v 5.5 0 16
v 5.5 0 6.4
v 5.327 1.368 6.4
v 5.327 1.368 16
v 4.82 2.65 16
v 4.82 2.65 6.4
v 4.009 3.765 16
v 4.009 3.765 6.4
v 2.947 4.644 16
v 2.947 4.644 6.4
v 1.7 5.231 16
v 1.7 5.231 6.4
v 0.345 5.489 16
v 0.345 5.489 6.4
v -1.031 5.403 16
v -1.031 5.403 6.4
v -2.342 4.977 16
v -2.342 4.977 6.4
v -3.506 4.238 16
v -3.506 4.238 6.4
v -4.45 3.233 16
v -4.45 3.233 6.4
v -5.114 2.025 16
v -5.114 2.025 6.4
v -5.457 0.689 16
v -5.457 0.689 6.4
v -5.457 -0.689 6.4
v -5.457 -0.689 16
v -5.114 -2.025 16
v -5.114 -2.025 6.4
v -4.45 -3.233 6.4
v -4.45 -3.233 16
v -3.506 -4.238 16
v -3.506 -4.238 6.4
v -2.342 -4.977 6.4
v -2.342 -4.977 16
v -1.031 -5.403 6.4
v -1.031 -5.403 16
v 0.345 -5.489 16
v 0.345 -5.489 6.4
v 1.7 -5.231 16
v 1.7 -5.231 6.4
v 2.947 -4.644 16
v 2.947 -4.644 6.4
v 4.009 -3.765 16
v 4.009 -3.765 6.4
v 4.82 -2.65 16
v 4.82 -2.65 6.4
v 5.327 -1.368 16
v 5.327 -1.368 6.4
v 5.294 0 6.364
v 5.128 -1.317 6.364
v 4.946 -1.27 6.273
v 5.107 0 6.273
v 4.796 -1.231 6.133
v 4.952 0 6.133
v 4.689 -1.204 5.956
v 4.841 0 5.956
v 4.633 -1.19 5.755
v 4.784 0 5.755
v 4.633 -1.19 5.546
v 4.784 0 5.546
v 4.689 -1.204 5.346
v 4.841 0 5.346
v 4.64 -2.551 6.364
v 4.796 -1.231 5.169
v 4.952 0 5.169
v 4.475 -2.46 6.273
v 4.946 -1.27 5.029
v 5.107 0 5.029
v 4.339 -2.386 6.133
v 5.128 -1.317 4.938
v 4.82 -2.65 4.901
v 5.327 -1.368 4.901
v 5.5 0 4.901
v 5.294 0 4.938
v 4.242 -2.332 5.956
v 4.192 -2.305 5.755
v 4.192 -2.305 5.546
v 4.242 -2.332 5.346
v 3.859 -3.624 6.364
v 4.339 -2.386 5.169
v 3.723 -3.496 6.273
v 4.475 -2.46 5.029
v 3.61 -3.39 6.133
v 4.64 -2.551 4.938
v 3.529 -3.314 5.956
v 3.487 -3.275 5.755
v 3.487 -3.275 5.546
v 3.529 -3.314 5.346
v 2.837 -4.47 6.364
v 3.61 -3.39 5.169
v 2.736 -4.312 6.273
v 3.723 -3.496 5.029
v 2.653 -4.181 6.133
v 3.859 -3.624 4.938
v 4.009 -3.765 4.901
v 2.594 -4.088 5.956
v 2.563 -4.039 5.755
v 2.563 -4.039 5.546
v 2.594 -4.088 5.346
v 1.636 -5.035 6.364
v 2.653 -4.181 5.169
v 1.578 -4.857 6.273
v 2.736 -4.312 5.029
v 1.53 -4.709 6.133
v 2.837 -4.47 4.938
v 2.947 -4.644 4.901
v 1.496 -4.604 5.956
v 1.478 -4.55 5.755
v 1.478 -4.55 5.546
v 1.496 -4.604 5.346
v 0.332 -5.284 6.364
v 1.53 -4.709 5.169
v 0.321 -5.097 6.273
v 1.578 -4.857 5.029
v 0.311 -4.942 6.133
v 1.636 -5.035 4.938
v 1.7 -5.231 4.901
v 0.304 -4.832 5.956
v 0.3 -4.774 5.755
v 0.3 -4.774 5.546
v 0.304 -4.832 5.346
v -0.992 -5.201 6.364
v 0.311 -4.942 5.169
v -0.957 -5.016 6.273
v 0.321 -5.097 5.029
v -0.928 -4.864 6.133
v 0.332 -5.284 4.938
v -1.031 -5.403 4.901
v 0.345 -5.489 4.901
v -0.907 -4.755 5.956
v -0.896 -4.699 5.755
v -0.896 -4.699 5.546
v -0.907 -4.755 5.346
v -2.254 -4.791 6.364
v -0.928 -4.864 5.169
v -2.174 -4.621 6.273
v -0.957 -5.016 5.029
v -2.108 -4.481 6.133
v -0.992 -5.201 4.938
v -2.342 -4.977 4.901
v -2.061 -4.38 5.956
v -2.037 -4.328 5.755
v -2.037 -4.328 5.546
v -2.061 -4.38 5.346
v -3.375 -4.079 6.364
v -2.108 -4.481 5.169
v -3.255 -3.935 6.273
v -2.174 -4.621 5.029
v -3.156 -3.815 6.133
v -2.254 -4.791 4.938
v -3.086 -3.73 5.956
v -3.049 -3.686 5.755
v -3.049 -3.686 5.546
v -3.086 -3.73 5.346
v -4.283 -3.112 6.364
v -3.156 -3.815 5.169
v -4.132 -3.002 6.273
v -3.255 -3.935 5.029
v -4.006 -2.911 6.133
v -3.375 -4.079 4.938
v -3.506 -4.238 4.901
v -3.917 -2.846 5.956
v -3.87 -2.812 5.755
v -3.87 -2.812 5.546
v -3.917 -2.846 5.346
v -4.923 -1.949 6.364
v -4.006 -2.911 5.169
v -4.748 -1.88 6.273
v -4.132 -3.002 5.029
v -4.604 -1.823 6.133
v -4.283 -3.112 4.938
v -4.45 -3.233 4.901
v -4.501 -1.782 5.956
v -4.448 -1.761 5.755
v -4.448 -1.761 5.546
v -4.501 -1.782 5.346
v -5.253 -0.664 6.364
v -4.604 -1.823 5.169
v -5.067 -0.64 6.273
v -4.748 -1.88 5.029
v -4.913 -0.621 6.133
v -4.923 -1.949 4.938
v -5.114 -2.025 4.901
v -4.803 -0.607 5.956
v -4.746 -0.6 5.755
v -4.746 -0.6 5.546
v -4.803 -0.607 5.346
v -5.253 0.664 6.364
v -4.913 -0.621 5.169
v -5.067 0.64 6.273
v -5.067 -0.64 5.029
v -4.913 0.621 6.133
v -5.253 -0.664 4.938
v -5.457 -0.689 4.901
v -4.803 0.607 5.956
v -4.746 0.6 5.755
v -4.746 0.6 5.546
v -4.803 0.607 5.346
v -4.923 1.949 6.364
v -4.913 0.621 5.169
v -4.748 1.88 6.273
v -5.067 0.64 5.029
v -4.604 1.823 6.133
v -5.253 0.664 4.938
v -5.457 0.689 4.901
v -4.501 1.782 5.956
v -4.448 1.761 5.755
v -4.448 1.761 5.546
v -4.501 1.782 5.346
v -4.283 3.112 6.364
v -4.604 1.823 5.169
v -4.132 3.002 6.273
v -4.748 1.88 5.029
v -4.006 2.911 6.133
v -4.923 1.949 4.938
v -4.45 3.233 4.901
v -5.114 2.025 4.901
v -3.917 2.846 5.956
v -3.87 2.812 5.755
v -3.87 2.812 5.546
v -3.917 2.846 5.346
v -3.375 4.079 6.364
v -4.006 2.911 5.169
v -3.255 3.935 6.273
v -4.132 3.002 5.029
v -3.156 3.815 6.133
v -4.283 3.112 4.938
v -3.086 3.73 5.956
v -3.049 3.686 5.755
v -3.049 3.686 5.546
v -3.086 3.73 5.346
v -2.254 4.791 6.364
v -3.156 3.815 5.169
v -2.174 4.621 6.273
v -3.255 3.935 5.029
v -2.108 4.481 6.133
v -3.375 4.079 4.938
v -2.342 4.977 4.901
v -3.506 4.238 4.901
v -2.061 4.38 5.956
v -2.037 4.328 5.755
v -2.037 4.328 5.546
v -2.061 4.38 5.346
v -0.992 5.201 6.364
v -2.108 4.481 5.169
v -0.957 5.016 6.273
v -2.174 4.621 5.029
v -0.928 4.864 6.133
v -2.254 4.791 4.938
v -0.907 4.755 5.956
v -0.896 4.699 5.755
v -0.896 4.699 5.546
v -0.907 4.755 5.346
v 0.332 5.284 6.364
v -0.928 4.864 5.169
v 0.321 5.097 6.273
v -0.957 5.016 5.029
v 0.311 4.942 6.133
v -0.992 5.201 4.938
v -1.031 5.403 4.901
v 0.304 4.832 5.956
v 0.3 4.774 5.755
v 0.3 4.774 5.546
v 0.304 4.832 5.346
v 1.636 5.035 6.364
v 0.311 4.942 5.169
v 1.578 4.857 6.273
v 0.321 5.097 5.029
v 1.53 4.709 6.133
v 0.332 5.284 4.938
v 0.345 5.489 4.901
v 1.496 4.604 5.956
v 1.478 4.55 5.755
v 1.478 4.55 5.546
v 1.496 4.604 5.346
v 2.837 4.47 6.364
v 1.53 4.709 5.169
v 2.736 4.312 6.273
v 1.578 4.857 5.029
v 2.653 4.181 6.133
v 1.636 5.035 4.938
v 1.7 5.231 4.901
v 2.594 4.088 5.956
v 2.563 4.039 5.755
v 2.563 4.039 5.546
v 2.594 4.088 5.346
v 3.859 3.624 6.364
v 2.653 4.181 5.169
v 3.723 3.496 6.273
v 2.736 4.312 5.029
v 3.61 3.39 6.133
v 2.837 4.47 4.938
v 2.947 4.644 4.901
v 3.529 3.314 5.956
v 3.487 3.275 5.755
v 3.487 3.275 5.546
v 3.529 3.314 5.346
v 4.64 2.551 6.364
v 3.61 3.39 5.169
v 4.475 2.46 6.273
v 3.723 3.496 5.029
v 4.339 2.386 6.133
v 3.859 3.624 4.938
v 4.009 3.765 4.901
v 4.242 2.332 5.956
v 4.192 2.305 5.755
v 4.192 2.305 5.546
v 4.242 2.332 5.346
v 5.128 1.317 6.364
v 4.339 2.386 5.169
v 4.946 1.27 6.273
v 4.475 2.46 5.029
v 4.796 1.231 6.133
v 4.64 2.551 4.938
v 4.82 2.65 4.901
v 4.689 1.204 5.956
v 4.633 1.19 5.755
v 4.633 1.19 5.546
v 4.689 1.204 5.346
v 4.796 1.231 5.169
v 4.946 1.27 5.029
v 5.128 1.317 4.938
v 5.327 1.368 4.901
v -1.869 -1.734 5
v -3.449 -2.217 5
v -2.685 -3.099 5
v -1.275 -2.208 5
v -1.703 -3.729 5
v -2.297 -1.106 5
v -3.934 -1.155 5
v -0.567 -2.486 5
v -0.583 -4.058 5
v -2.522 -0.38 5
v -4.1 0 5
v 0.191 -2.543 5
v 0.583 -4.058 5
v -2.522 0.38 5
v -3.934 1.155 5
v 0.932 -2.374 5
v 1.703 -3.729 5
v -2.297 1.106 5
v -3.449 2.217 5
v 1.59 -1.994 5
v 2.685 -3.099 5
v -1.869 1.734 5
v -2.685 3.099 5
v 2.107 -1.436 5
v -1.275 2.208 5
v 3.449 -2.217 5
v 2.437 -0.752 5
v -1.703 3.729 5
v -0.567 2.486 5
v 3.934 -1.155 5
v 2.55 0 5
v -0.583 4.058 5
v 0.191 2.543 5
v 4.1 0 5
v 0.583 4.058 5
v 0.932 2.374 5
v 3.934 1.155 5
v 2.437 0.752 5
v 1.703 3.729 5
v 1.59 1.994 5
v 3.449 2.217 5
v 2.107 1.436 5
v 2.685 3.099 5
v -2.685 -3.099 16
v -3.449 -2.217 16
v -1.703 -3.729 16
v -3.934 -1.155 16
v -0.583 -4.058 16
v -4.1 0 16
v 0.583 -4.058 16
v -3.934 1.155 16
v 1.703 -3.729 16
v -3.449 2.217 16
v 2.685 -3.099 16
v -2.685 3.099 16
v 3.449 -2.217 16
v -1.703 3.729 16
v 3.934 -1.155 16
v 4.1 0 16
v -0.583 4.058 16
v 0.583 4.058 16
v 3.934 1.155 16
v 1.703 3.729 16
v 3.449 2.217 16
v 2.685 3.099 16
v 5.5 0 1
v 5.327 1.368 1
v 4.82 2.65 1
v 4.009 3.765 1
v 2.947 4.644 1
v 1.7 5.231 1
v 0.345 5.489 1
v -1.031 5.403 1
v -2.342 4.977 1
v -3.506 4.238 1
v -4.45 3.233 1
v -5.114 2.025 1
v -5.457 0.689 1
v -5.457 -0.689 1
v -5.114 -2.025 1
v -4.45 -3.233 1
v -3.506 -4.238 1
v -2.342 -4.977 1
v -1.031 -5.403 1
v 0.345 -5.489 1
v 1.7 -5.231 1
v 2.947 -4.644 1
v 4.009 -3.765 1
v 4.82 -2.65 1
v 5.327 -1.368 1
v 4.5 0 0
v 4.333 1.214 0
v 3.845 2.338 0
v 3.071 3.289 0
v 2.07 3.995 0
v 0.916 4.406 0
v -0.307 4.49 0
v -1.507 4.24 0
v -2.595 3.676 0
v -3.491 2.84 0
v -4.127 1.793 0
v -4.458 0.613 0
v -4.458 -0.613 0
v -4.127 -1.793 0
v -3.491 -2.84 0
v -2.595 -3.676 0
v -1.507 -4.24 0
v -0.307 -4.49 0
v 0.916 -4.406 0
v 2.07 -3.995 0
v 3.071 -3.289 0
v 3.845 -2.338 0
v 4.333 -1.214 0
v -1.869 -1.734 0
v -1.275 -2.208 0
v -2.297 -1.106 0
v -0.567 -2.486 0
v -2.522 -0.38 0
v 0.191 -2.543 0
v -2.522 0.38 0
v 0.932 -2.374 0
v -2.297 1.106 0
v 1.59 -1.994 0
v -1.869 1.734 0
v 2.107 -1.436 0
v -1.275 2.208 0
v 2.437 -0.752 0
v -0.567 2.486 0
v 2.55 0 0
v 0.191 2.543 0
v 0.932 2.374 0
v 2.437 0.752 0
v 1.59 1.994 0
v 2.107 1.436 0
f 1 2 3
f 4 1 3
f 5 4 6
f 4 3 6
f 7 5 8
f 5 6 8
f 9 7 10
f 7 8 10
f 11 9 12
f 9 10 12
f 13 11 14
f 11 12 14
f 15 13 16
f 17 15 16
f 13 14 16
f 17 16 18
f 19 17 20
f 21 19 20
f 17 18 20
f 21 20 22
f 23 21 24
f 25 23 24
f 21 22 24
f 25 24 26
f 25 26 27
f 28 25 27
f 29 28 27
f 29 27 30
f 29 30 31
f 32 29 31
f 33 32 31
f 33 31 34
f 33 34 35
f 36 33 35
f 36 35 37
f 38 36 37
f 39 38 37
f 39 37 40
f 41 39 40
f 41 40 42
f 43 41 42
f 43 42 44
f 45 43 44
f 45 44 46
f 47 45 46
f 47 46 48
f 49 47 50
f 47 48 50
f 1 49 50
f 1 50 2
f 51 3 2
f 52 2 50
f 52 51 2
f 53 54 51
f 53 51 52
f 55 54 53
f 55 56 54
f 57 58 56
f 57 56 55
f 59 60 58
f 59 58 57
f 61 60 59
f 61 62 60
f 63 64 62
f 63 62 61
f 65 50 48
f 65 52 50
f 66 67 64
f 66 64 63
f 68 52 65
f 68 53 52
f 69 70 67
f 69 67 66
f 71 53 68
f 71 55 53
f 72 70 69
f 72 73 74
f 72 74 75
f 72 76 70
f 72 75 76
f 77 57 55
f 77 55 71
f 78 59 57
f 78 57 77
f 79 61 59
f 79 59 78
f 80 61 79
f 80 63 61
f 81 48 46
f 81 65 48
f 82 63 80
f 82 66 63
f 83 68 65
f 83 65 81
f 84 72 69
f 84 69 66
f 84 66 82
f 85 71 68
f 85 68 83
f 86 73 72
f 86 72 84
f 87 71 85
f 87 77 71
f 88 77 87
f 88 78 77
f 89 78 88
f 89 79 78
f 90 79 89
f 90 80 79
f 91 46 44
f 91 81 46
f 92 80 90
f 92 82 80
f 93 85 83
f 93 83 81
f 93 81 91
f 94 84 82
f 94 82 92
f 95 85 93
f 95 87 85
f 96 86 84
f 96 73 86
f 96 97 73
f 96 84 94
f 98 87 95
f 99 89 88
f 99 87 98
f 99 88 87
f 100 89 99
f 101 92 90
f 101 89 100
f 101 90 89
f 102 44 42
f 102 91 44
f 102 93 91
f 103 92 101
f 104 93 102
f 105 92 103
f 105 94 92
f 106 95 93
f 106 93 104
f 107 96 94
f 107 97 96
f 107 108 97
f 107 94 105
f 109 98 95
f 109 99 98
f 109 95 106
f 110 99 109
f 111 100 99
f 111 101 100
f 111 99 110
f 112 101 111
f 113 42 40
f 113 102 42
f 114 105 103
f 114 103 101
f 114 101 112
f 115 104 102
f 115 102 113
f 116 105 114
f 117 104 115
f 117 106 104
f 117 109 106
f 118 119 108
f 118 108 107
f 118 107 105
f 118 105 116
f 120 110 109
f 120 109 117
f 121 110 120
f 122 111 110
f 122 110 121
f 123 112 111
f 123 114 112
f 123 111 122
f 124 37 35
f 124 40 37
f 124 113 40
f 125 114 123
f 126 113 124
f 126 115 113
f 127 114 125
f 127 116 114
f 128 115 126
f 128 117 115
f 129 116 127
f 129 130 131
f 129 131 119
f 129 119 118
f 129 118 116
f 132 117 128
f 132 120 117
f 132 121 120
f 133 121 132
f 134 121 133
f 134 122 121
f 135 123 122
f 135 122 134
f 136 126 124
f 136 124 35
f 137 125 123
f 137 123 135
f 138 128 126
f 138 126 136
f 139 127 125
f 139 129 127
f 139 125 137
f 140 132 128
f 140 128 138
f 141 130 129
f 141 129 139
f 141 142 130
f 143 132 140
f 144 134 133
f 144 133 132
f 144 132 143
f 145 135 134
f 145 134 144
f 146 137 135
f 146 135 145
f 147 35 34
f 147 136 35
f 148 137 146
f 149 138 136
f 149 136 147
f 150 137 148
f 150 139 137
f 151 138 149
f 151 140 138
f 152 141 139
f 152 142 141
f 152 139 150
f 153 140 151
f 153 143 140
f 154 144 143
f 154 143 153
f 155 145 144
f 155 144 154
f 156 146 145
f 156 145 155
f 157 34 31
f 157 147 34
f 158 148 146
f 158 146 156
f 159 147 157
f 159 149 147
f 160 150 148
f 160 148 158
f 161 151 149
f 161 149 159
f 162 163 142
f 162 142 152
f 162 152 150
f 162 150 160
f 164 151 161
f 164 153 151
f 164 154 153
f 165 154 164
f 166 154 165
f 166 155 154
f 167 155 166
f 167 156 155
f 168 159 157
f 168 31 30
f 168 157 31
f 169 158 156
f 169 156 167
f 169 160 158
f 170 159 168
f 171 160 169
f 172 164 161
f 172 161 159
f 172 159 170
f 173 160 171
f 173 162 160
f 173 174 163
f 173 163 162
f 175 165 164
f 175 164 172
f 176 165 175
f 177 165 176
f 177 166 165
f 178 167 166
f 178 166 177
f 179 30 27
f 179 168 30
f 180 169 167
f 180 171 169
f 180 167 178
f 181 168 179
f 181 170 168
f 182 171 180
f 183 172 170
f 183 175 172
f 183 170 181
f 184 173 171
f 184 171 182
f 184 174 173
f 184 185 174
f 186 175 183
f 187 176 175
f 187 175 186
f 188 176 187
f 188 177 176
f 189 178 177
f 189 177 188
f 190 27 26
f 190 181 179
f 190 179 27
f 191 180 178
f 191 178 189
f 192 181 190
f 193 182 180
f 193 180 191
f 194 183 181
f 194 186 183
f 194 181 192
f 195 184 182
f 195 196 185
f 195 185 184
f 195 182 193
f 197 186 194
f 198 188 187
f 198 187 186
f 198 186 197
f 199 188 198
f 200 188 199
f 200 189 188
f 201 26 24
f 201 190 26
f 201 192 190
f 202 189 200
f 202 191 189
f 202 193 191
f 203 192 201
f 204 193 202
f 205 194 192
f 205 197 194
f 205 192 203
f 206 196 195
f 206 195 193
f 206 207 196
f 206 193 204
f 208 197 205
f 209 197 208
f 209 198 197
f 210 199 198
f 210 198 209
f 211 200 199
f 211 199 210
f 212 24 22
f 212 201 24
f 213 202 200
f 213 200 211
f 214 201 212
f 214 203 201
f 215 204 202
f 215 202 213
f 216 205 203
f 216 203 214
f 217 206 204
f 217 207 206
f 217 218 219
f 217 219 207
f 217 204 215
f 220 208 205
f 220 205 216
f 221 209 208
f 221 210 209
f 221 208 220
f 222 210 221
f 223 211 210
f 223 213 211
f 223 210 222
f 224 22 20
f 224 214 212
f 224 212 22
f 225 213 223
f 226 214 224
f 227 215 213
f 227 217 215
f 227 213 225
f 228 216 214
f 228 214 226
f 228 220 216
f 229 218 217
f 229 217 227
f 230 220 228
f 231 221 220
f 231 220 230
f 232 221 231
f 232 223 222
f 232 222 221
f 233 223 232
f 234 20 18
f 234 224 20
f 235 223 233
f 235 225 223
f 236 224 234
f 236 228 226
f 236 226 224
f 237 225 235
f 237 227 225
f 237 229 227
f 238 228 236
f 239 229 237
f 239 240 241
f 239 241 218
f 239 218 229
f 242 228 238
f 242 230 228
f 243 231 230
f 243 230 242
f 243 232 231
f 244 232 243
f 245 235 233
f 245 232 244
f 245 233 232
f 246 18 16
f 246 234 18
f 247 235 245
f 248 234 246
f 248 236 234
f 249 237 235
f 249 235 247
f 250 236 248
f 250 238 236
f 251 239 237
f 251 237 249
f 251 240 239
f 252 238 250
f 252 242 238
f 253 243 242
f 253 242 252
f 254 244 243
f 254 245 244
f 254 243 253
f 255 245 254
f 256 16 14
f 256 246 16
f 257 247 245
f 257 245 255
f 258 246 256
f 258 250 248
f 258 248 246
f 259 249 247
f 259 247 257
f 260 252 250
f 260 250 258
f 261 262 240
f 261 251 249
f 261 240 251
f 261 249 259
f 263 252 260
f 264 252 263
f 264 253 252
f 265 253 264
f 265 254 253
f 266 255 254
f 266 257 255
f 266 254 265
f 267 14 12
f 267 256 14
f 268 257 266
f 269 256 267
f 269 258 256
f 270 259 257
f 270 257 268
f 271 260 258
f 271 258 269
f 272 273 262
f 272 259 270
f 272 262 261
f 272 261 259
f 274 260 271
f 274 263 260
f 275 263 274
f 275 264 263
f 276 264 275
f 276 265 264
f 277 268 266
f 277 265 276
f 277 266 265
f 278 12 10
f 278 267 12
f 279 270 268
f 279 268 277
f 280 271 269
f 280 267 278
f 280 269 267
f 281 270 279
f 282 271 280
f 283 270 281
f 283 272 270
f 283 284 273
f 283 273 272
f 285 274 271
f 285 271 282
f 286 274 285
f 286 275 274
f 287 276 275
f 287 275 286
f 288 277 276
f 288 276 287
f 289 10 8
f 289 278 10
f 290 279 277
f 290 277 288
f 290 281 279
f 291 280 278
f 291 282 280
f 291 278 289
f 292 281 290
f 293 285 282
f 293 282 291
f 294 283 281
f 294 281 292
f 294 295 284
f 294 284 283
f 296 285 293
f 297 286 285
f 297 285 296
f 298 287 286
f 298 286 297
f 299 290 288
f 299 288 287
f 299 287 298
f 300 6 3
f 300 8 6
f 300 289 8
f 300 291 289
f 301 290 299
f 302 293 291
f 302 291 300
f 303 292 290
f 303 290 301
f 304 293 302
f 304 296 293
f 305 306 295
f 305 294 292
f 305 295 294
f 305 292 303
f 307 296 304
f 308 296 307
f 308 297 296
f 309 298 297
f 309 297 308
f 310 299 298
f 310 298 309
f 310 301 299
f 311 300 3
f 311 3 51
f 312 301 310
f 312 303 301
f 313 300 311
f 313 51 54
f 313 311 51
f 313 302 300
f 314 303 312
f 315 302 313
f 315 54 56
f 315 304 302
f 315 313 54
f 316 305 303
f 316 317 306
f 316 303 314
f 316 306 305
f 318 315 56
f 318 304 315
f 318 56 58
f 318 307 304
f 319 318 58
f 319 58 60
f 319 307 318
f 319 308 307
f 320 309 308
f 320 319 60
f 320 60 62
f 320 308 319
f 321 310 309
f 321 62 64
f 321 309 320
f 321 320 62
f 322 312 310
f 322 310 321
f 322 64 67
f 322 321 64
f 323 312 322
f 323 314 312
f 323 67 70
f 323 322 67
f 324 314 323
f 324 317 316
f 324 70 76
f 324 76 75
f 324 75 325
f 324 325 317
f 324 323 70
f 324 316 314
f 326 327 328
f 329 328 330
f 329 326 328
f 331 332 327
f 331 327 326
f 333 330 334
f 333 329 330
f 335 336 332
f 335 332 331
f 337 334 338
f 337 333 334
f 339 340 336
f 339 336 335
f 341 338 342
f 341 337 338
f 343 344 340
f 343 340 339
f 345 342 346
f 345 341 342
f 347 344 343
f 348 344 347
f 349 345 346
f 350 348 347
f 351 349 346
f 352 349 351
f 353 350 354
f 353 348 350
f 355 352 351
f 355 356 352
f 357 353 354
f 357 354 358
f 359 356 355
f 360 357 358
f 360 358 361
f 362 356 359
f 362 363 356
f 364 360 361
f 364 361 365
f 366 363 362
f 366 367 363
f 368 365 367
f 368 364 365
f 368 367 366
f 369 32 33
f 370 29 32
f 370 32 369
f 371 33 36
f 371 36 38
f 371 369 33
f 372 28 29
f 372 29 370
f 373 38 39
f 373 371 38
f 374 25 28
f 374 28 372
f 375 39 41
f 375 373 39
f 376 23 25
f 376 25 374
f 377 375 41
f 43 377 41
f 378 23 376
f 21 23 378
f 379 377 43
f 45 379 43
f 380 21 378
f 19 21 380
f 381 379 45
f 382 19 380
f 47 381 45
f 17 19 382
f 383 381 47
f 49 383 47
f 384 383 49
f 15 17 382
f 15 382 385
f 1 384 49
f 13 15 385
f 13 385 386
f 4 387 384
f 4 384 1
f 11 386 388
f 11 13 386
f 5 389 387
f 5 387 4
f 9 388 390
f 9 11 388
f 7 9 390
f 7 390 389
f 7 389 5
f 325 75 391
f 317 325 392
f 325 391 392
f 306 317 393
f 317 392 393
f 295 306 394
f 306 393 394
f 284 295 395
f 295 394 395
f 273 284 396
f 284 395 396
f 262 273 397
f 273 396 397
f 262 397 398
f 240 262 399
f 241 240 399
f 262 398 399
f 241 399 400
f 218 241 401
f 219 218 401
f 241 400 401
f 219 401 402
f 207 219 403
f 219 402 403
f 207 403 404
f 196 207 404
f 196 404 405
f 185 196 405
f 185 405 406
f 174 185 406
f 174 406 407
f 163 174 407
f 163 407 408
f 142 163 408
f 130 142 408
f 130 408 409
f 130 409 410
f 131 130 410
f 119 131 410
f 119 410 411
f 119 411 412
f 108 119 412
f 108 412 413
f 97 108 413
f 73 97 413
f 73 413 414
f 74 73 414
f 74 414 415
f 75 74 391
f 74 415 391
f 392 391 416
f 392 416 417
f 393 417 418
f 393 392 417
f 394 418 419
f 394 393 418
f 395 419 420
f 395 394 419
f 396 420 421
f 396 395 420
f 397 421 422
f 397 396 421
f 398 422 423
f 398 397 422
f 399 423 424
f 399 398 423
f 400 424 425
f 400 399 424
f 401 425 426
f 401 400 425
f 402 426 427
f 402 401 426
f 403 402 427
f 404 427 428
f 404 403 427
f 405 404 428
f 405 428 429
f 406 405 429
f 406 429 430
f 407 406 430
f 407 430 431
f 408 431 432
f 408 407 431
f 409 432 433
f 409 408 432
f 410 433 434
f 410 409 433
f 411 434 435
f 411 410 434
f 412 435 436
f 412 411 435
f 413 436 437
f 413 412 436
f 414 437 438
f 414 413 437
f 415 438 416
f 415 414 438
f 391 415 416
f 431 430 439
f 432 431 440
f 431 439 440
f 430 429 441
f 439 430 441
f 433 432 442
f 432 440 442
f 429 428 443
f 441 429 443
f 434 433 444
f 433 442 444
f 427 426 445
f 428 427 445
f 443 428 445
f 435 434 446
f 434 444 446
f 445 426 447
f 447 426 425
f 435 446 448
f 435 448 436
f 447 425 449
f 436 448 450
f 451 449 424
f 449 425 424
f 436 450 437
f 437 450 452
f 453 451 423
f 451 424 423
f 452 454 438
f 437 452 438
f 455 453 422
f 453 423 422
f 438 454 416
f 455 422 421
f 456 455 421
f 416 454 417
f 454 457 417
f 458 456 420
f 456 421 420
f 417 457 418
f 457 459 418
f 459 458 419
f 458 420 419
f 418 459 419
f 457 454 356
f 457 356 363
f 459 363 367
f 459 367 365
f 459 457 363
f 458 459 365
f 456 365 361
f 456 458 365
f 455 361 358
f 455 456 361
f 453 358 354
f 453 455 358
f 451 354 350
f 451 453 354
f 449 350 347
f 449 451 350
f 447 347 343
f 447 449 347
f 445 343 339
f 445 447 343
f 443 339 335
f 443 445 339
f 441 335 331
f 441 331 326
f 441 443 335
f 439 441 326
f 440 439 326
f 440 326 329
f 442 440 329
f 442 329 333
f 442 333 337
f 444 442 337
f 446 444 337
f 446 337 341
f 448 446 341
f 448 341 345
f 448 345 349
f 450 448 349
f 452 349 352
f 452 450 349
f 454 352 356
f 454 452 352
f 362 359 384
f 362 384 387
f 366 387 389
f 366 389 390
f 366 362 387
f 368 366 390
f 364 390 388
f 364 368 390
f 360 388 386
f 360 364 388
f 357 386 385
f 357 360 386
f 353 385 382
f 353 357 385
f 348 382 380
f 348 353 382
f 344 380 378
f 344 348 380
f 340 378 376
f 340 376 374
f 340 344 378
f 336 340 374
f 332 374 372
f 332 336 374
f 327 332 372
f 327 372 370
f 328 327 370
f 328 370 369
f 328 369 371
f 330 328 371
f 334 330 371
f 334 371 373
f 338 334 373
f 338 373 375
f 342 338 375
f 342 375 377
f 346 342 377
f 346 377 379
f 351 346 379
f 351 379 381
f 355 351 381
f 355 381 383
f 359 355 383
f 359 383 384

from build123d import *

# Parameters (mm, degrees)
F0_R     = 5.5
F0_R_2   = 4.1
F1_DEPTH = 16
F0_R_3   = 2.55
F2_DEPTH = 5
F3_SIZE  = 1
F4_R     = 0.75


with BuildPart() as f1:
    # F0 (on Top) → F1 (new body)
    with BuildSketch(Plane.XY):
        Circle(F0_R)
        Circle(F0_R_2, mode=Mode.SUBTRACT)
    extrude(amount=F1_DEPTH)

    # F0 (on Top) → F2 (join)
    with BuildSketch(Plane.XY):
        Circle(F0_R_2)
        Circle(F0_R_3, mode=Mode.SUBTRACT)
    extrude(amount=F2_DEPTH)

    # F3
    f3_edges = [f1.edges().sort_by_distance(p)[0] for p in [
        (-5.5, 0, 0),
    ]]
    chamfer(f3_edges, length=F3_SIZE)

    # F4 (on Front) → F5 (revolve, cut)
    with BuildSketch(Plane.XZ):
        with Locations((5.526415, 5.650808)):
            Circle(F4_R)
    revolve(axis=Axis((0, 0, 0), (0, 0, -1)), mode=Mode.SUBTRACT)


solid = f1.part
